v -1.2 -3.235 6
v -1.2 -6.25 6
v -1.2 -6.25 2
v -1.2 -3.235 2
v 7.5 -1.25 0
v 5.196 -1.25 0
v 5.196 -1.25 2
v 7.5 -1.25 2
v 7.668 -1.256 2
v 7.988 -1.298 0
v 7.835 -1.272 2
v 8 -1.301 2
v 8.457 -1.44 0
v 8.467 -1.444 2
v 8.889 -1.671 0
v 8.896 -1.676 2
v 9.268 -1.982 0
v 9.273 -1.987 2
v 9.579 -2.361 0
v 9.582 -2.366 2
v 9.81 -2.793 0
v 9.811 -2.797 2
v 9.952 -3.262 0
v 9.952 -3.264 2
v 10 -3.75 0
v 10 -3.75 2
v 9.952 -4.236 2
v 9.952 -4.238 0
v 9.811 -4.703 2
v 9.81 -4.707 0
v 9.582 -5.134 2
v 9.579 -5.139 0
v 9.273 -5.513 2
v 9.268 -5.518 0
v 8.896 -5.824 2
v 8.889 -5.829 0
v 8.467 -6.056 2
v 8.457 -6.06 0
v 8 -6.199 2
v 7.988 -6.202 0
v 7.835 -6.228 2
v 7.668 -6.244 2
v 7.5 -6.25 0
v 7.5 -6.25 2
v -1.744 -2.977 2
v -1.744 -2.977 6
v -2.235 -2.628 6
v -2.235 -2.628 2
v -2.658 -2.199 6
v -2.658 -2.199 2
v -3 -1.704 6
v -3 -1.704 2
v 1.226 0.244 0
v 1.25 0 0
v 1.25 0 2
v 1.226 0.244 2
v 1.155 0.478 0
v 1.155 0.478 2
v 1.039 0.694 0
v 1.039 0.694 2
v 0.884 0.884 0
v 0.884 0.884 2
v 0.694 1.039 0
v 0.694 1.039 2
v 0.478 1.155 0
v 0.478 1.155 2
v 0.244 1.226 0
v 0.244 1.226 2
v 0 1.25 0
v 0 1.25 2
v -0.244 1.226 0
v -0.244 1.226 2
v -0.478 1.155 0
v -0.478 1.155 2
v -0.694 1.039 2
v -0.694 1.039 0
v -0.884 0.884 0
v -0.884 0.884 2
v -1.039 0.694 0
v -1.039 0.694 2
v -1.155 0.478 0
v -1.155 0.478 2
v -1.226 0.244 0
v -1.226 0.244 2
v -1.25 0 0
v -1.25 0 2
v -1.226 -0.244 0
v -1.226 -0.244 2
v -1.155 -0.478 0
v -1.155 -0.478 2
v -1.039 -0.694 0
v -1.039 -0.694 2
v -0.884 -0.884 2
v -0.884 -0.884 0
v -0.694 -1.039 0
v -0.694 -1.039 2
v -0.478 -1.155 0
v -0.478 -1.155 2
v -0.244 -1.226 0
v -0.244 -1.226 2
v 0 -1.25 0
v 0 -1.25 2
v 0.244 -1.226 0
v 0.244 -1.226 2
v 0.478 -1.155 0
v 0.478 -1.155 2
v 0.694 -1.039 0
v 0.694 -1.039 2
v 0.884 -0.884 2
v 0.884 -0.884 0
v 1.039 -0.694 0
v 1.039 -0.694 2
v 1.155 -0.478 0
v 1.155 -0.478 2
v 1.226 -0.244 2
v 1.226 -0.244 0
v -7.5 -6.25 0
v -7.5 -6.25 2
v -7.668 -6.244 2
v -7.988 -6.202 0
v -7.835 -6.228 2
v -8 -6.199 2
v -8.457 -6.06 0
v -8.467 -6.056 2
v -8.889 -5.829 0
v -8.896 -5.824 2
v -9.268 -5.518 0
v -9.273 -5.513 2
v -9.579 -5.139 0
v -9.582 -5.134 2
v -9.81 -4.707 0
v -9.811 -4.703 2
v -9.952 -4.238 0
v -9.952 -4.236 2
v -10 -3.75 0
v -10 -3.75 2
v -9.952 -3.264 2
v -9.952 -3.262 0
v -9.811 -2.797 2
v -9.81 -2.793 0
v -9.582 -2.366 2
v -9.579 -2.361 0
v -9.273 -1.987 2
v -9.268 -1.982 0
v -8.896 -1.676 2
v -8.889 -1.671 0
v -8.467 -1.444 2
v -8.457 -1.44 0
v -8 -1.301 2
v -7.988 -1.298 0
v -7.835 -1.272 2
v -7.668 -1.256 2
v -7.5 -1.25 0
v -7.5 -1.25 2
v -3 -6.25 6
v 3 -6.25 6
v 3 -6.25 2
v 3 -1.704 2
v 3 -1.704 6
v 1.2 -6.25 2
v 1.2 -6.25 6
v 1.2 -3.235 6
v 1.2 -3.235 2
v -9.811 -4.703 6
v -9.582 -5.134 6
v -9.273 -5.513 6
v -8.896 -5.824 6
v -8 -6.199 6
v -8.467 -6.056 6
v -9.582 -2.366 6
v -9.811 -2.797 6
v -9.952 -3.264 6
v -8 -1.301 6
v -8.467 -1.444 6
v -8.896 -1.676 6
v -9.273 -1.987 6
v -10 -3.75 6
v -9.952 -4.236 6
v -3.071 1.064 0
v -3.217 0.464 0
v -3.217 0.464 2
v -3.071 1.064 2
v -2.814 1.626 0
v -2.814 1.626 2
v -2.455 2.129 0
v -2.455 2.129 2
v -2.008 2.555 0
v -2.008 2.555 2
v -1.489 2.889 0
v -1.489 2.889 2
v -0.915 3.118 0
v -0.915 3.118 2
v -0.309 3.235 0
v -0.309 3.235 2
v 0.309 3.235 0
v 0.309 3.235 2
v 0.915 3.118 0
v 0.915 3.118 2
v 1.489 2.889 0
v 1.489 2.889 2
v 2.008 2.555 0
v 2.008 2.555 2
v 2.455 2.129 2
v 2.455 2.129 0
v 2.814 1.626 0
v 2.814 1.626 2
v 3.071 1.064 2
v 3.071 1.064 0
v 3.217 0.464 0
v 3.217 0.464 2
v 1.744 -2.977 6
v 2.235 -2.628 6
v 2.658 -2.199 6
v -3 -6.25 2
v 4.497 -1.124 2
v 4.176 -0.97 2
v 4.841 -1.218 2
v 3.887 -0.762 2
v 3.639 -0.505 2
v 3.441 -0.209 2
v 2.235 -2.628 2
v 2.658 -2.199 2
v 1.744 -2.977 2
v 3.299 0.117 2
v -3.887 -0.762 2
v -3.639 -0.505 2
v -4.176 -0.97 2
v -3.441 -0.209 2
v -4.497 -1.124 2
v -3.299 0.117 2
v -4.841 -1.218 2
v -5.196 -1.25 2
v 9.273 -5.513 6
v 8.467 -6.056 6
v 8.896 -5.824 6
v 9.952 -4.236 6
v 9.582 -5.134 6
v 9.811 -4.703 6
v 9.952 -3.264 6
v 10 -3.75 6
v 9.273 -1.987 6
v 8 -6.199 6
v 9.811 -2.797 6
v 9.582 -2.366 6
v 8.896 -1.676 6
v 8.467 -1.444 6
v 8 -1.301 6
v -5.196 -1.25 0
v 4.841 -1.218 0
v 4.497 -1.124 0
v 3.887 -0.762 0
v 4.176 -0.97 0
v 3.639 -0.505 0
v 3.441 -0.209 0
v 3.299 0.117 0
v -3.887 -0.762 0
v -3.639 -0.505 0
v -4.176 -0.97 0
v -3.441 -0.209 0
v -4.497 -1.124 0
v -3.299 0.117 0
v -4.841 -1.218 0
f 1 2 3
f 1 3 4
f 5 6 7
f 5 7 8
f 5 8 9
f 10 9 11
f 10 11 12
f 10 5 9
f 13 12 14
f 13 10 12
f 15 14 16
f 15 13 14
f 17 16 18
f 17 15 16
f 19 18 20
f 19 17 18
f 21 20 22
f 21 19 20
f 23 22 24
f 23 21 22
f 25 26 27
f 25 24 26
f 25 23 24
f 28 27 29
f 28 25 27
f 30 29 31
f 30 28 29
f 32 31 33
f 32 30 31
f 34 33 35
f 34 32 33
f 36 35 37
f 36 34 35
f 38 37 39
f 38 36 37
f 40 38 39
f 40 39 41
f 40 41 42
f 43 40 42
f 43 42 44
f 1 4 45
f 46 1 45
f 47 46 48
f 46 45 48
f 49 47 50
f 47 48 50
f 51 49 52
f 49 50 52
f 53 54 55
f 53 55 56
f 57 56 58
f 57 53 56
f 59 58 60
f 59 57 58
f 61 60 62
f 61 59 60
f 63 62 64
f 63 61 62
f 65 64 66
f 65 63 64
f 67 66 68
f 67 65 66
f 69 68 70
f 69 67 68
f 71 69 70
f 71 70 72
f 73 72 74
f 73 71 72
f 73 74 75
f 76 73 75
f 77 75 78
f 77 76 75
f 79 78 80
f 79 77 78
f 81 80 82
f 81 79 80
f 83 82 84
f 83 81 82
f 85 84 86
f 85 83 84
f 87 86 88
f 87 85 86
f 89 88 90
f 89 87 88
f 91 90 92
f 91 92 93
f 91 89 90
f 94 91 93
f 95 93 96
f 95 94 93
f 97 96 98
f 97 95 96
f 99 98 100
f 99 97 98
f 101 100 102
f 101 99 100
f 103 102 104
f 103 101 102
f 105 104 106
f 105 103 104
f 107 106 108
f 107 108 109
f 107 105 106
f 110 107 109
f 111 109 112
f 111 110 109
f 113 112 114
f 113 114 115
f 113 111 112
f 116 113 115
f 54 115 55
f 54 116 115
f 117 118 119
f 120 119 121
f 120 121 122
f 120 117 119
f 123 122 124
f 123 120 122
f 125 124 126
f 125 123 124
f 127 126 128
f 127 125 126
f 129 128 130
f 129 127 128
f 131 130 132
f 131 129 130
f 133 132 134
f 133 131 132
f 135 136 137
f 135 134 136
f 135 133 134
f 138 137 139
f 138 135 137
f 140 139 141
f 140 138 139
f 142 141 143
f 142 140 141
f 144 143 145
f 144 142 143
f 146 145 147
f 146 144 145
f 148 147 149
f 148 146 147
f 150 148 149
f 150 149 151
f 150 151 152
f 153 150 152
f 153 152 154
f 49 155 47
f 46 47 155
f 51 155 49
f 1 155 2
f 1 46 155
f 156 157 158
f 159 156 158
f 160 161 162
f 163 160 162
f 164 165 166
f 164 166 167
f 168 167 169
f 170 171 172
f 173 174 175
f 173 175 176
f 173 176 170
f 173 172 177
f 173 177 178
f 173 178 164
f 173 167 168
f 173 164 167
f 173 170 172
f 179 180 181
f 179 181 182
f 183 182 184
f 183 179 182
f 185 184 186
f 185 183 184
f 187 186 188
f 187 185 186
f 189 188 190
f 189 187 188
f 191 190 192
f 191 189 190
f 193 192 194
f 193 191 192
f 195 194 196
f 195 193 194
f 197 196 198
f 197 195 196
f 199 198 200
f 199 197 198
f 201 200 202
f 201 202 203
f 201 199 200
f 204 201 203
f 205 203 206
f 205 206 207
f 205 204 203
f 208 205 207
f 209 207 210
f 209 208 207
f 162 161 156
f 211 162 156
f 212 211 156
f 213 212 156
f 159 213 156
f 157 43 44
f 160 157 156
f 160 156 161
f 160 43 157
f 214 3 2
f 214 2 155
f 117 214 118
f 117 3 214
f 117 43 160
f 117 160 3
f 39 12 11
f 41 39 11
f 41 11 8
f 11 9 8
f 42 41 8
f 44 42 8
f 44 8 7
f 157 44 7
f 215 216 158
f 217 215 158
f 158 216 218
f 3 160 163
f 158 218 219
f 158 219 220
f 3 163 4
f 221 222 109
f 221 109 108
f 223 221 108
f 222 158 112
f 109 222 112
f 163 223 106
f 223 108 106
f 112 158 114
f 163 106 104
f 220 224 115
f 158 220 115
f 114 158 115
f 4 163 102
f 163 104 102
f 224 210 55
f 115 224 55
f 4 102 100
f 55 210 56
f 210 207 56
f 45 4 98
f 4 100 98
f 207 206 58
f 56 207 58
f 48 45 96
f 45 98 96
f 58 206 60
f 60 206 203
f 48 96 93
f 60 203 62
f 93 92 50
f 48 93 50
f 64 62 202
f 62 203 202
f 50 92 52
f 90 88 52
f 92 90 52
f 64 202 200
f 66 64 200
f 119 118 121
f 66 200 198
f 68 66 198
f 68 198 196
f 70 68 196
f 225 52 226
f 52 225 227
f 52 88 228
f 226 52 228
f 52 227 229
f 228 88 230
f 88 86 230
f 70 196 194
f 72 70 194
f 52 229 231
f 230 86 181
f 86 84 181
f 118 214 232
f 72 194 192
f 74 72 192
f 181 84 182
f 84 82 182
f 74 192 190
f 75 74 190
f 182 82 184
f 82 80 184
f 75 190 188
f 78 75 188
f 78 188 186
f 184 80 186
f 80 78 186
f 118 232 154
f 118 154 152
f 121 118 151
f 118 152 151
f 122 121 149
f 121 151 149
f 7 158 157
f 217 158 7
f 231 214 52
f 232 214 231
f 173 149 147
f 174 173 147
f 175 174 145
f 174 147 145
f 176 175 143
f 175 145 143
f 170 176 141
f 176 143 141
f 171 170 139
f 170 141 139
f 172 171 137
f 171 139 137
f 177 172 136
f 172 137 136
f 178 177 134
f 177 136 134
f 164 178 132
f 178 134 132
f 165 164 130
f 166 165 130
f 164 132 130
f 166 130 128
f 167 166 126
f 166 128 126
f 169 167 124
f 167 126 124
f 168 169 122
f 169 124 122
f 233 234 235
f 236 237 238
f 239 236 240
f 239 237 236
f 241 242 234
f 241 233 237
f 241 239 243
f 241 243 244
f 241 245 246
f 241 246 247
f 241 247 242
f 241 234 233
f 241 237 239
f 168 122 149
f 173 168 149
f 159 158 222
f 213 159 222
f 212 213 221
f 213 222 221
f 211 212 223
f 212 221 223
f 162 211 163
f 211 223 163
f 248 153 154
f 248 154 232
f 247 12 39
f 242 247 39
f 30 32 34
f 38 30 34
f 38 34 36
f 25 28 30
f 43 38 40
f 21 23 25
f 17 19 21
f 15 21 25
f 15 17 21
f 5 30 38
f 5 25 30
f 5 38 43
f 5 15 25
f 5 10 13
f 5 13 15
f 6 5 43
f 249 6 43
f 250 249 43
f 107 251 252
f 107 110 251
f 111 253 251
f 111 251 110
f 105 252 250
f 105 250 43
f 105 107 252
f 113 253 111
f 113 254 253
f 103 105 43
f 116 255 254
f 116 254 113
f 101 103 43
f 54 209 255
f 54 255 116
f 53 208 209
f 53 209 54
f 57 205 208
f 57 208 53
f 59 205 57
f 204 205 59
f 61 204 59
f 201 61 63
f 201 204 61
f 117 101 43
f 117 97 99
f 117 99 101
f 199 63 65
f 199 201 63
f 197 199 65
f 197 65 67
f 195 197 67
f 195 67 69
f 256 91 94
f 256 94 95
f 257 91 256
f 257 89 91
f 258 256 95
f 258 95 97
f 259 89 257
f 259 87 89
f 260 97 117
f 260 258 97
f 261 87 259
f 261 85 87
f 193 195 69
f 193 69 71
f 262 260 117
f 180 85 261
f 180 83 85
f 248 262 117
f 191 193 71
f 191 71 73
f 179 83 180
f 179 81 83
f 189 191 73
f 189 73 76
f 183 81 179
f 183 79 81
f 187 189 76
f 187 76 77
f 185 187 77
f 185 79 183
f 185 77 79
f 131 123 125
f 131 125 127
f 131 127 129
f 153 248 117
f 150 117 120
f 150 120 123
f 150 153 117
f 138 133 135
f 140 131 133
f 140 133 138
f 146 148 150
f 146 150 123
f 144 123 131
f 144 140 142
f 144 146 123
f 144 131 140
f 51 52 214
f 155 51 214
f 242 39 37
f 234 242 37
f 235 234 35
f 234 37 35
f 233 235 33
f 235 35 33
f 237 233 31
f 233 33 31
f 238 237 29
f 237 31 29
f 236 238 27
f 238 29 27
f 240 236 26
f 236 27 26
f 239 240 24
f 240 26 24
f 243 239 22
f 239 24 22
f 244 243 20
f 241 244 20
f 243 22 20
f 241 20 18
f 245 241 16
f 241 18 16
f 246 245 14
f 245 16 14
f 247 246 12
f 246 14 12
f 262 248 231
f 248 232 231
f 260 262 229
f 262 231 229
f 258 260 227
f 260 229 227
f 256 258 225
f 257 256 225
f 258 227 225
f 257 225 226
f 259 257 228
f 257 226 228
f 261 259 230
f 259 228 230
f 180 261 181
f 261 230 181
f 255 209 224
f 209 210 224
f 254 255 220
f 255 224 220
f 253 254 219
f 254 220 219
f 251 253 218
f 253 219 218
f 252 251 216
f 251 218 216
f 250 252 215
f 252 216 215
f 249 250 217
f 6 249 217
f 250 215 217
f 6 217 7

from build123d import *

# Parameters (mm, degrees)
SKETCH1_R           = 1.25
BOSS_EXTRUDE1_DEPTH = 2
BOSS_EXTRUDE2_DEPTH = 4
FILLET1_R           = 2
SKETCH3_W           = 2.4
SKETCH3_H           = 3.015421202
CUT_EXTRUDE1_DEPTH  = 4


with BuildPart() as part:
    # Sketch1 → Boss-Extrude1 (new body)
    with BuildSketch(Plane.XY):
        with BuildLine():
            Line((-7.5, -1.25), (-3, -1.25))
            ThreePointArc((-3, -1.25), (0, 3.25), (3, -1.25))
            Line((3, -1.25), (7.5, -1.25))
            ThreePointArc((7.5, -1.25), (10, -3.75), (7.5, -6.25))
            Line((7.5, -6.25), (-7.5, -6.25))
            ThreePointArc((-7.5, -6.25), (-10, -3.75), (-7.5, -1.25))
        make_face()
        Circle(SKETCH1_R, mode=Mode.SUBTRACT)
    extrude(amount=BOSS_EXTRUDE1_DEPTH)

    # Sketch2 → Boss-Extrude2 (add)
    with BuildSketch(Plane.XY.offset(2)):
        with BuildLine():
            Line((-8, -6.199489743), (-8, -1.300510257))
            ThreePointArc((-8, -1.300510257), (-10, -3.75), (-8, -6.199489743))
        make_face()
        with BuildLine():
            ThreePointArc((3, -1.703672504), (0, -3.45), (-3, -1.703672504))
            Line((-3, -1.703672504), (-3, -6.25))
            Line((-3, -6.25), (3, -6.25))
            Line((3, -6.25), (3, -1.703672504))
        make_face()
        with BuildLine():
            ThreePointArc((8, -6.199489743), (10, -3.75), (8, -1.300510257))
            Line((8, -1.300510257), (8, -6.199489743))
        make_face()
    extrude(amount=BOSS_EXTRUDE2_DEPTH)

    # Fillet1
    fillet1_edges = [part.edges().sort_by_distance(p)[0] for p in [
        (3, -1.25, 1),
        (-3, -1.25, 1),
    ]]
    fillet(fillet1_edges, radius=FILLET1_R)

    # Sketch3 → Cut-Extrude1 (cut)
    with BuildSketch(Plane.XY.offset(6)):
        with Locations((0, -4.742289399)):
            Rectangle(SKETCH3_W, SKETCH3_H)
    extrude(amount=-CUT_EXTRUDE1_DEPTH, mode=Mode.SUBTRACT)


solid = part.part
